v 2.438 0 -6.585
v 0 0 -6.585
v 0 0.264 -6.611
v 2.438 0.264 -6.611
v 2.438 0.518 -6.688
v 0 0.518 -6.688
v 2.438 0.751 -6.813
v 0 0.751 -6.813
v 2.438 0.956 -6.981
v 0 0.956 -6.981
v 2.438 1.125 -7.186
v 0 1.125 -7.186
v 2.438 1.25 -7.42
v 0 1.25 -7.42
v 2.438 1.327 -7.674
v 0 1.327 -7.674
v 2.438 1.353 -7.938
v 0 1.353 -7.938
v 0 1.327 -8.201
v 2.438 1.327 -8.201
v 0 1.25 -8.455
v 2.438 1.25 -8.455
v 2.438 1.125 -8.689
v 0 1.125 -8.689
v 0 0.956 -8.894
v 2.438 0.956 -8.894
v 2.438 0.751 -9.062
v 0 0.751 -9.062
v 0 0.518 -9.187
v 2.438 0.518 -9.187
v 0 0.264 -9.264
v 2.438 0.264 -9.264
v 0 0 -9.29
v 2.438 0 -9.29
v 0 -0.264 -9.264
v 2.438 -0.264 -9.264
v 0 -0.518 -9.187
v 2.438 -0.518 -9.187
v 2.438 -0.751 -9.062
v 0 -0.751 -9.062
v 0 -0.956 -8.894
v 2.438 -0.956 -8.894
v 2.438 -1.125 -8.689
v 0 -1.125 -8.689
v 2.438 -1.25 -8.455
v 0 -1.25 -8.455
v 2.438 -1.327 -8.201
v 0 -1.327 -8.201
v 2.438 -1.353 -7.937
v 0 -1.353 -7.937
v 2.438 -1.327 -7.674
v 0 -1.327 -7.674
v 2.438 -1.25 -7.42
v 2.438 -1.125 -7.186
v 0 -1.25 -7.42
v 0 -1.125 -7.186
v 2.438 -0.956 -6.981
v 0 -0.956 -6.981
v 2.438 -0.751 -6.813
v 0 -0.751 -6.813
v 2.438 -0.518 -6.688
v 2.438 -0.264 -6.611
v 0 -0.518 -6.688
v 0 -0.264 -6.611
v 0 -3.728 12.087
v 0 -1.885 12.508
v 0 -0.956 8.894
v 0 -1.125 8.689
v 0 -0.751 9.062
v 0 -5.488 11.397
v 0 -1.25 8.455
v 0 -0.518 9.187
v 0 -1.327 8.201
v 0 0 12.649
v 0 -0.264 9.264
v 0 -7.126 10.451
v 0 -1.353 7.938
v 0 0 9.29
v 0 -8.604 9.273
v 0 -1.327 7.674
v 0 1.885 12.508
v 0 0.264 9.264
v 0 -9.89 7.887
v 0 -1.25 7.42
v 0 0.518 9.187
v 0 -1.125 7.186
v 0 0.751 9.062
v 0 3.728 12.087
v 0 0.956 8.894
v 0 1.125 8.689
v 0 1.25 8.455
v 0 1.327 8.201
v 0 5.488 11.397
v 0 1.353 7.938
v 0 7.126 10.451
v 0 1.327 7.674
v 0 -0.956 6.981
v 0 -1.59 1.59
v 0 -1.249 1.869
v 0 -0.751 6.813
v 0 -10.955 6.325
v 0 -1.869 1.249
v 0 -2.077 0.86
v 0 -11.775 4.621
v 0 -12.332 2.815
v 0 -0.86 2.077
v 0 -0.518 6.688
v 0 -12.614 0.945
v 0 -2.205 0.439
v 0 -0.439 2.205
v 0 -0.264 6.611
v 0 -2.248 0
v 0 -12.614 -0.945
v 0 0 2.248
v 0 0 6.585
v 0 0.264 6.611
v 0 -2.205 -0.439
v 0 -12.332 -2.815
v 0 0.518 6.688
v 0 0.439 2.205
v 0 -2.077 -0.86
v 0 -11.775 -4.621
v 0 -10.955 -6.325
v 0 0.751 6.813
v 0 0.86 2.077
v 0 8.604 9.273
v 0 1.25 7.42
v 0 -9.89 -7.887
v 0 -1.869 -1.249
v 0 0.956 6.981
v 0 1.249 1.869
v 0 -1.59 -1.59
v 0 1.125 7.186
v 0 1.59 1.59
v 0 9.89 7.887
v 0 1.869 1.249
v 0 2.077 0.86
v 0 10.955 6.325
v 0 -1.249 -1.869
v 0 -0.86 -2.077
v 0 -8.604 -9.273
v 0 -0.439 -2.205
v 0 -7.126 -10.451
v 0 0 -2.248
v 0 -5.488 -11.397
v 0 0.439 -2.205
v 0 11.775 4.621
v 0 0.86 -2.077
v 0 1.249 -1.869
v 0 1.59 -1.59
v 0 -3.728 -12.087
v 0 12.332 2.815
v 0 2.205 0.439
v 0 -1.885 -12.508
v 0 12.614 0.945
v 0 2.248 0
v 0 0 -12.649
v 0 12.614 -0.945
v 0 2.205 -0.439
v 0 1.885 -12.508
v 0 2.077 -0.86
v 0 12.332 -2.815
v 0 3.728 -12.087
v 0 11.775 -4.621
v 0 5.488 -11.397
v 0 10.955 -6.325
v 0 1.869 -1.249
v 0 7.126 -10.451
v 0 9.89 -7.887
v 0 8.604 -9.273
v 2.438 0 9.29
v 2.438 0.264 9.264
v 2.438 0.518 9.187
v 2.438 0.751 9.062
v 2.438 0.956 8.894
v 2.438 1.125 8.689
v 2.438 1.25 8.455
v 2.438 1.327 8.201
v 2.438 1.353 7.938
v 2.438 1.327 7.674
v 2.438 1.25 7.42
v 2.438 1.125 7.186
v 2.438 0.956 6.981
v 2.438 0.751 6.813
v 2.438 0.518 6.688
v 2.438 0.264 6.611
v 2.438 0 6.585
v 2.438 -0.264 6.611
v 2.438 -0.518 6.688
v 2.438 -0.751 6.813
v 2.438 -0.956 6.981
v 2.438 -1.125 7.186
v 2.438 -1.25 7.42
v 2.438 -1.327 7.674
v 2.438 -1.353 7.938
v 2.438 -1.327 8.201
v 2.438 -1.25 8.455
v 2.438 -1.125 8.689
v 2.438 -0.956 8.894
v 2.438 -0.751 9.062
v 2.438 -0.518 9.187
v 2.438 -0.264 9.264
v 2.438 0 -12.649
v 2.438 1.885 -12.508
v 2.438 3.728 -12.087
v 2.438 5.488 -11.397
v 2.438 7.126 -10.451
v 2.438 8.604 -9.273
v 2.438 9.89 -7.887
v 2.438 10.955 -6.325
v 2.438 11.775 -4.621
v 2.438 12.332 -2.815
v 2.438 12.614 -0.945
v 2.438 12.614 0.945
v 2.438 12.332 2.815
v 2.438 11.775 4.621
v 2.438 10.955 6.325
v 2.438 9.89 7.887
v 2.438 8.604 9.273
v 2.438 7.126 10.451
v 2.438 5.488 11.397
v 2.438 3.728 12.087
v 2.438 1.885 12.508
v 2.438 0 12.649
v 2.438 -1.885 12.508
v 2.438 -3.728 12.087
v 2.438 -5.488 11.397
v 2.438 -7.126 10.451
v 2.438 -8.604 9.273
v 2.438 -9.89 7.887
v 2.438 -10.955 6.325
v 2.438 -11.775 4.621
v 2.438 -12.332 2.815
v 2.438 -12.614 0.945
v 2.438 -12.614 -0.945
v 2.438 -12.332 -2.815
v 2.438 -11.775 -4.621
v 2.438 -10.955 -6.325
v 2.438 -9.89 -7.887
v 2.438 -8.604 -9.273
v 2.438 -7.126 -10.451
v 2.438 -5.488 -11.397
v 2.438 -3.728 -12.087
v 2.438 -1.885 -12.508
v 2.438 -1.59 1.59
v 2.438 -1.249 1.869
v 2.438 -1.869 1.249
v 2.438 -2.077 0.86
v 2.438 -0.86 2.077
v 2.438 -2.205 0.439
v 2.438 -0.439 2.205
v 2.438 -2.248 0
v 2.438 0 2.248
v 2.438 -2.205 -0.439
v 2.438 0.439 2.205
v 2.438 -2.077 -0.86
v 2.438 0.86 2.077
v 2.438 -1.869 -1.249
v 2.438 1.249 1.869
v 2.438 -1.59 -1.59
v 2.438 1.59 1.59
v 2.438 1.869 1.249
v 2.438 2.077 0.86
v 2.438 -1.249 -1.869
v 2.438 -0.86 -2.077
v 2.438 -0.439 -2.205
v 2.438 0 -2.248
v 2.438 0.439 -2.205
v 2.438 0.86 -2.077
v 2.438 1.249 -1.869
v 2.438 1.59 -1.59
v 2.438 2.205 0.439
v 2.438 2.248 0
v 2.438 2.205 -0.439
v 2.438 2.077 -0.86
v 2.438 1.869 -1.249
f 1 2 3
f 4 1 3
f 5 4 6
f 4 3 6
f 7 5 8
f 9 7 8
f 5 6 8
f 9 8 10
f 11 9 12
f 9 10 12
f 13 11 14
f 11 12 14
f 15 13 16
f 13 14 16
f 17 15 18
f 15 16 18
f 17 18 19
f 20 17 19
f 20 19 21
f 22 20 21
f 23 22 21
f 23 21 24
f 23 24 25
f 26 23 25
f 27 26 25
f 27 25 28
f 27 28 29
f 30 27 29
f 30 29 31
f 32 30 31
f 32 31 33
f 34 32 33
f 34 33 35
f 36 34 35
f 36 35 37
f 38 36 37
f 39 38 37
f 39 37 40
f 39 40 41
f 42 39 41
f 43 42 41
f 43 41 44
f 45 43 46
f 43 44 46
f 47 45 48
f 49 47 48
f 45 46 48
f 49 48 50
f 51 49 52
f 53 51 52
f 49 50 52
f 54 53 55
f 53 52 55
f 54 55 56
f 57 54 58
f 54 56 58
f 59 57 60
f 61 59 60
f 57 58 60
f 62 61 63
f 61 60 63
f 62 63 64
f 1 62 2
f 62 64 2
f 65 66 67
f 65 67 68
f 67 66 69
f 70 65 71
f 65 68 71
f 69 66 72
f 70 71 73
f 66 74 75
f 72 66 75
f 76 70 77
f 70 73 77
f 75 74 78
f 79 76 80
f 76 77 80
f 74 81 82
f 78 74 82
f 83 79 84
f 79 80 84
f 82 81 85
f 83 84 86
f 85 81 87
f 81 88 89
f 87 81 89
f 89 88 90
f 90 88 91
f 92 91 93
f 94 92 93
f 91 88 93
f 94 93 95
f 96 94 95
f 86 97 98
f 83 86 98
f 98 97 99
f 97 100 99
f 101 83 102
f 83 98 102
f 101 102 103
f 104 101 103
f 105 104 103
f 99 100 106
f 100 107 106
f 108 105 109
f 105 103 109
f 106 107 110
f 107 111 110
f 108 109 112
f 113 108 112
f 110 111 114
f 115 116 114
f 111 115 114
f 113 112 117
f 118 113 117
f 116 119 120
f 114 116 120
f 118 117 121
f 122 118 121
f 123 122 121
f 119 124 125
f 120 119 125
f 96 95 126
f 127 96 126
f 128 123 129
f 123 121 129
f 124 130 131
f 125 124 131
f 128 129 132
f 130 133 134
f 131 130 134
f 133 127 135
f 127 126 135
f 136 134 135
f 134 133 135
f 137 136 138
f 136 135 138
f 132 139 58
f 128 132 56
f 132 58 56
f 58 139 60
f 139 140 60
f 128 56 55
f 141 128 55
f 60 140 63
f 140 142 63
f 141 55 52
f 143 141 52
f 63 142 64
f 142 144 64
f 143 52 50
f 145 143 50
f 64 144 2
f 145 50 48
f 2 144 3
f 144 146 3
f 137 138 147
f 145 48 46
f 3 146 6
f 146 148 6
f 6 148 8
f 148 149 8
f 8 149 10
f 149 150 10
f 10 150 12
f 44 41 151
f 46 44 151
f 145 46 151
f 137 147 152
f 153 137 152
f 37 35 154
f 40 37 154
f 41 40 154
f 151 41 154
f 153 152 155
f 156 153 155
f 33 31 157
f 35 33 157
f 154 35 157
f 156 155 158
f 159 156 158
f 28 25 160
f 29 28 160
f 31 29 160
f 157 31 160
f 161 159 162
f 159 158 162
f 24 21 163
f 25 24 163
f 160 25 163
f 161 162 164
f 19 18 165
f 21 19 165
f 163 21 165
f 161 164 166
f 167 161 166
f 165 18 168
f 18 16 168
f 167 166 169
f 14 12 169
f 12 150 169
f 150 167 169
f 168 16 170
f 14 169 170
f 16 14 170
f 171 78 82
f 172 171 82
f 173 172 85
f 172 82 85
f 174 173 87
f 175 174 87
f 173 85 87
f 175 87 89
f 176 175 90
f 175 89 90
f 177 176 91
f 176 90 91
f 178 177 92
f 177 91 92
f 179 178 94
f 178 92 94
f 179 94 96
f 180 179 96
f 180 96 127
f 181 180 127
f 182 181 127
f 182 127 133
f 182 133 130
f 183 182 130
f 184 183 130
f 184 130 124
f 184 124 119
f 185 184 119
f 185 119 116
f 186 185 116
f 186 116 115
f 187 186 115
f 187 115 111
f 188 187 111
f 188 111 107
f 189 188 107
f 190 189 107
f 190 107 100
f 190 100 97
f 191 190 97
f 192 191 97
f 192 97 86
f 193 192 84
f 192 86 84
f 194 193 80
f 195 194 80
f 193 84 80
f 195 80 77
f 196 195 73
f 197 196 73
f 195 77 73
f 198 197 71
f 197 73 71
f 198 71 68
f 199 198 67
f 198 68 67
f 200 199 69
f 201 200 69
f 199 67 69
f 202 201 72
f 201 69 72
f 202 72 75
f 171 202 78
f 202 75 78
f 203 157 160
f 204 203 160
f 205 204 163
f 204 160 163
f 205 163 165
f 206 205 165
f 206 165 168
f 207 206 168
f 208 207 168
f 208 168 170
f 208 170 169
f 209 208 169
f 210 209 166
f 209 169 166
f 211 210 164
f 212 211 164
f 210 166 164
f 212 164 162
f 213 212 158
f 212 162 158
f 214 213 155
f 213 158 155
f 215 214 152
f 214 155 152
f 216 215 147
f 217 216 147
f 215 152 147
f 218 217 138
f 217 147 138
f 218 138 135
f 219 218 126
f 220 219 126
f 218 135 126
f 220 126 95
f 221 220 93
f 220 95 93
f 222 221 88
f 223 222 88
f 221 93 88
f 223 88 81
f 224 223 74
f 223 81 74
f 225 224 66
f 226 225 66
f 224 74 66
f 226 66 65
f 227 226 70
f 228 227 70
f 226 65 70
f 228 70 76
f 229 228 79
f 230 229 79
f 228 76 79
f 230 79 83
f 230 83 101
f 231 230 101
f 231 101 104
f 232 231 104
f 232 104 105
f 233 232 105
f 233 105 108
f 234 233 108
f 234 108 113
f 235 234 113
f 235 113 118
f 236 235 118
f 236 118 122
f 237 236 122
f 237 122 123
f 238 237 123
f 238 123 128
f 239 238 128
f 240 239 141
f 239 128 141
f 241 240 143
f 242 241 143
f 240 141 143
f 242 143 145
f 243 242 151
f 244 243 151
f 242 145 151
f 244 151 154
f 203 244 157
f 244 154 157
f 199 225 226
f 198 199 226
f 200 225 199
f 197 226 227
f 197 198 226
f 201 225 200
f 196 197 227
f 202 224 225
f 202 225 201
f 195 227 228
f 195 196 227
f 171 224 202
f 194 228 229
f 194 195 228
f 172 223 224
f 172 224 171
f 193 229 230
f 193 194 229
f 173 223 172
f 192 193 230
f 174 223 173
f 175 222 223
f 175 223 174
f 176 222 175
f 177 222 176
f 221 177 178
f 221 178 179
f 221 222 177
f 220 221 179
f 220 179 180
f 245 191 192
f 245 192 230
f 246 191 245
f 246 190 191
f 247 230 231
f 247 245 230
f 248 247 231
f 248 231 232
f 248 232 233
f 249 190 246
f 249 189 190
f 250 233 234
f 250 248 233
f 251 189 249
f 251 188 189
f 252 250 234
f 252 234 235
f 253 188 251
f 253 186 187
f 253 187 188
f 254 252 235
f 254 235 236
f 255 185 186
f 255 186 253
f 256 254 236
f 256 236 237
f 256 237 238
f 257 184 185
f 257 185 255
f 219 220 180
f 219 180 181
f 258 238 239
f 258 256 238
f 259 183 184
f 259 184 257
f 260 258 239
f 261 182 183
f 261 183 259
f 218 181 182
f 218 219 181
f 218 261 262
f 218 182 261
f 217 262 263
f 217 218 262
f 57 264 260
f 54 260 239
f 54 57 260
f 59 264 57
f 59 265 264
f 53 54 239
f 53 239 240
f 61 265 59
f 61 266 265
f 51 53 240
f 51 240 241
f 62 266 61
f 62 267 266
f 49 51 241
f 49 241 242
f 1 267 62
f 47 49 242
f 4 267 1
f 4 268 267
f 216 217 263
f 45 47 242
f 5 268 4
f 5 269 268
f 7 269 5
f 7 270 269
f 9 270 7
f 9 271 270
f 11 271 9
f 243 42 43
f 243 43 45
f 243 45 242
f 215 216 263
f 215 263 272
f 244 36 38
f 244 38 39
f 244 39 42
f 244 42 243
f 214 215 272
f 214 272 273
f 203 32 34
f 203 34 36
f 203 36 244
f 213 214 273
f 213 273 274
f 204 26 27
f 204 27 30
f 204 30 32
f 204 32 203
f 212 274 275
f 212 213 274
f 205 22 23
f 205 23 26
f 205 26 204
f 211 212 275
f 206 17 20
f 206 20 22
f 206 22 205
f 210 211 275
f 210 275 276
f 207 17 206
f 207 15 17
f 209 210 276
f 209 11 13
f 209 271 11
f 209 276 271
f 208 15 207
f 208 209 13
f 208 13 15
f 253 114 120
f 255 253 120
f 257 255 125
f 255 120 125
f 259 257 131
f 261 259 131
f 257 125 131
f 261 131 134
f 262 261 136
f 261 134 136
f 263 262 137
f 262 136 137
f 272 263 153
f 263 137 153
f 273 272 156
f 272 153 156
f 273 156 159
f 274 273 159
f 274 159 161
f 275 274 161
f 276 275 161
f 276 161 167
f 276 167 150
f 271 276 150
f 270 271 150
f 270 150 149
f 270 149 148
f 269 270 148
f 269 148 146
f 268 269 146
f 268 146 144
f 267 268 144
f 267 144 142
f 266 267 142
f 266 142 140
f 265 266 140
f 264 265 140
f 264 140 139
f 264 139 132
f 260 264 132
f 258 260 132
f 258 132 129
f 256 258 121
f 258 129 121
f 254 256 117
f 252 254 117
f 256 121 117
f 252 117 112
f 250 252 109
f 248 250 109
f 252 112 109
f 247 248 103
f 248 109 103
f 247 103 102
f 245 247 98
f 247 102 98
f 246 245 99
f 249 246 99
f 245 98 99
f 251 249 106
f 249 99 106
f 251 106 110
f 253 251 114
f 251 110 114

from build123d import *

# Parameters (mm, degrees)
SKETCH1_R                     = 12.6492
BOSS_EXTRUDE1_DEPTH           = 2.4384
F_8_THREADED_ROD_CLEARANCE_D  = 4.4958
EJECTION_CHARGE_PASSTHROUGH_D = 2.7051


with BuildPart() as part:
    # Sketch1 → Boss-Extrude1 (new body)
    with BuildSketch(Plane(origin=(0, 0, 0), x_dir=(0, 0, -1), z_dir=(1, 0, 0))):
        Circle(SKETCH1_R)
    extrude(amount=BOSS_EXTRUDE1_DEPTH)

    # #8 Threaded Rod Clearance (through all)
    with Locations(Plane(origin=(2.4384, 0, 0), x_dir=(0, 0, -1), z_dir=(1, 0, 0))):
        with Locations((0, 0)):
            Hole(F_8_THREADED_ROD_CLEARANCE_D / 2)

    # Ejection Charge Passthrough (through all)
    with Locations(Plane(origin=(2.4384, 0, 0), x_dir=(0, 0, -1), z_dir=(1, 0, 0))):
        with Locations((-7.9375, 0), (7.9375, 0)):
            Hole(EJECTION_CHARGE_PASSTHROUGH_D / 2)


solid = part.part
